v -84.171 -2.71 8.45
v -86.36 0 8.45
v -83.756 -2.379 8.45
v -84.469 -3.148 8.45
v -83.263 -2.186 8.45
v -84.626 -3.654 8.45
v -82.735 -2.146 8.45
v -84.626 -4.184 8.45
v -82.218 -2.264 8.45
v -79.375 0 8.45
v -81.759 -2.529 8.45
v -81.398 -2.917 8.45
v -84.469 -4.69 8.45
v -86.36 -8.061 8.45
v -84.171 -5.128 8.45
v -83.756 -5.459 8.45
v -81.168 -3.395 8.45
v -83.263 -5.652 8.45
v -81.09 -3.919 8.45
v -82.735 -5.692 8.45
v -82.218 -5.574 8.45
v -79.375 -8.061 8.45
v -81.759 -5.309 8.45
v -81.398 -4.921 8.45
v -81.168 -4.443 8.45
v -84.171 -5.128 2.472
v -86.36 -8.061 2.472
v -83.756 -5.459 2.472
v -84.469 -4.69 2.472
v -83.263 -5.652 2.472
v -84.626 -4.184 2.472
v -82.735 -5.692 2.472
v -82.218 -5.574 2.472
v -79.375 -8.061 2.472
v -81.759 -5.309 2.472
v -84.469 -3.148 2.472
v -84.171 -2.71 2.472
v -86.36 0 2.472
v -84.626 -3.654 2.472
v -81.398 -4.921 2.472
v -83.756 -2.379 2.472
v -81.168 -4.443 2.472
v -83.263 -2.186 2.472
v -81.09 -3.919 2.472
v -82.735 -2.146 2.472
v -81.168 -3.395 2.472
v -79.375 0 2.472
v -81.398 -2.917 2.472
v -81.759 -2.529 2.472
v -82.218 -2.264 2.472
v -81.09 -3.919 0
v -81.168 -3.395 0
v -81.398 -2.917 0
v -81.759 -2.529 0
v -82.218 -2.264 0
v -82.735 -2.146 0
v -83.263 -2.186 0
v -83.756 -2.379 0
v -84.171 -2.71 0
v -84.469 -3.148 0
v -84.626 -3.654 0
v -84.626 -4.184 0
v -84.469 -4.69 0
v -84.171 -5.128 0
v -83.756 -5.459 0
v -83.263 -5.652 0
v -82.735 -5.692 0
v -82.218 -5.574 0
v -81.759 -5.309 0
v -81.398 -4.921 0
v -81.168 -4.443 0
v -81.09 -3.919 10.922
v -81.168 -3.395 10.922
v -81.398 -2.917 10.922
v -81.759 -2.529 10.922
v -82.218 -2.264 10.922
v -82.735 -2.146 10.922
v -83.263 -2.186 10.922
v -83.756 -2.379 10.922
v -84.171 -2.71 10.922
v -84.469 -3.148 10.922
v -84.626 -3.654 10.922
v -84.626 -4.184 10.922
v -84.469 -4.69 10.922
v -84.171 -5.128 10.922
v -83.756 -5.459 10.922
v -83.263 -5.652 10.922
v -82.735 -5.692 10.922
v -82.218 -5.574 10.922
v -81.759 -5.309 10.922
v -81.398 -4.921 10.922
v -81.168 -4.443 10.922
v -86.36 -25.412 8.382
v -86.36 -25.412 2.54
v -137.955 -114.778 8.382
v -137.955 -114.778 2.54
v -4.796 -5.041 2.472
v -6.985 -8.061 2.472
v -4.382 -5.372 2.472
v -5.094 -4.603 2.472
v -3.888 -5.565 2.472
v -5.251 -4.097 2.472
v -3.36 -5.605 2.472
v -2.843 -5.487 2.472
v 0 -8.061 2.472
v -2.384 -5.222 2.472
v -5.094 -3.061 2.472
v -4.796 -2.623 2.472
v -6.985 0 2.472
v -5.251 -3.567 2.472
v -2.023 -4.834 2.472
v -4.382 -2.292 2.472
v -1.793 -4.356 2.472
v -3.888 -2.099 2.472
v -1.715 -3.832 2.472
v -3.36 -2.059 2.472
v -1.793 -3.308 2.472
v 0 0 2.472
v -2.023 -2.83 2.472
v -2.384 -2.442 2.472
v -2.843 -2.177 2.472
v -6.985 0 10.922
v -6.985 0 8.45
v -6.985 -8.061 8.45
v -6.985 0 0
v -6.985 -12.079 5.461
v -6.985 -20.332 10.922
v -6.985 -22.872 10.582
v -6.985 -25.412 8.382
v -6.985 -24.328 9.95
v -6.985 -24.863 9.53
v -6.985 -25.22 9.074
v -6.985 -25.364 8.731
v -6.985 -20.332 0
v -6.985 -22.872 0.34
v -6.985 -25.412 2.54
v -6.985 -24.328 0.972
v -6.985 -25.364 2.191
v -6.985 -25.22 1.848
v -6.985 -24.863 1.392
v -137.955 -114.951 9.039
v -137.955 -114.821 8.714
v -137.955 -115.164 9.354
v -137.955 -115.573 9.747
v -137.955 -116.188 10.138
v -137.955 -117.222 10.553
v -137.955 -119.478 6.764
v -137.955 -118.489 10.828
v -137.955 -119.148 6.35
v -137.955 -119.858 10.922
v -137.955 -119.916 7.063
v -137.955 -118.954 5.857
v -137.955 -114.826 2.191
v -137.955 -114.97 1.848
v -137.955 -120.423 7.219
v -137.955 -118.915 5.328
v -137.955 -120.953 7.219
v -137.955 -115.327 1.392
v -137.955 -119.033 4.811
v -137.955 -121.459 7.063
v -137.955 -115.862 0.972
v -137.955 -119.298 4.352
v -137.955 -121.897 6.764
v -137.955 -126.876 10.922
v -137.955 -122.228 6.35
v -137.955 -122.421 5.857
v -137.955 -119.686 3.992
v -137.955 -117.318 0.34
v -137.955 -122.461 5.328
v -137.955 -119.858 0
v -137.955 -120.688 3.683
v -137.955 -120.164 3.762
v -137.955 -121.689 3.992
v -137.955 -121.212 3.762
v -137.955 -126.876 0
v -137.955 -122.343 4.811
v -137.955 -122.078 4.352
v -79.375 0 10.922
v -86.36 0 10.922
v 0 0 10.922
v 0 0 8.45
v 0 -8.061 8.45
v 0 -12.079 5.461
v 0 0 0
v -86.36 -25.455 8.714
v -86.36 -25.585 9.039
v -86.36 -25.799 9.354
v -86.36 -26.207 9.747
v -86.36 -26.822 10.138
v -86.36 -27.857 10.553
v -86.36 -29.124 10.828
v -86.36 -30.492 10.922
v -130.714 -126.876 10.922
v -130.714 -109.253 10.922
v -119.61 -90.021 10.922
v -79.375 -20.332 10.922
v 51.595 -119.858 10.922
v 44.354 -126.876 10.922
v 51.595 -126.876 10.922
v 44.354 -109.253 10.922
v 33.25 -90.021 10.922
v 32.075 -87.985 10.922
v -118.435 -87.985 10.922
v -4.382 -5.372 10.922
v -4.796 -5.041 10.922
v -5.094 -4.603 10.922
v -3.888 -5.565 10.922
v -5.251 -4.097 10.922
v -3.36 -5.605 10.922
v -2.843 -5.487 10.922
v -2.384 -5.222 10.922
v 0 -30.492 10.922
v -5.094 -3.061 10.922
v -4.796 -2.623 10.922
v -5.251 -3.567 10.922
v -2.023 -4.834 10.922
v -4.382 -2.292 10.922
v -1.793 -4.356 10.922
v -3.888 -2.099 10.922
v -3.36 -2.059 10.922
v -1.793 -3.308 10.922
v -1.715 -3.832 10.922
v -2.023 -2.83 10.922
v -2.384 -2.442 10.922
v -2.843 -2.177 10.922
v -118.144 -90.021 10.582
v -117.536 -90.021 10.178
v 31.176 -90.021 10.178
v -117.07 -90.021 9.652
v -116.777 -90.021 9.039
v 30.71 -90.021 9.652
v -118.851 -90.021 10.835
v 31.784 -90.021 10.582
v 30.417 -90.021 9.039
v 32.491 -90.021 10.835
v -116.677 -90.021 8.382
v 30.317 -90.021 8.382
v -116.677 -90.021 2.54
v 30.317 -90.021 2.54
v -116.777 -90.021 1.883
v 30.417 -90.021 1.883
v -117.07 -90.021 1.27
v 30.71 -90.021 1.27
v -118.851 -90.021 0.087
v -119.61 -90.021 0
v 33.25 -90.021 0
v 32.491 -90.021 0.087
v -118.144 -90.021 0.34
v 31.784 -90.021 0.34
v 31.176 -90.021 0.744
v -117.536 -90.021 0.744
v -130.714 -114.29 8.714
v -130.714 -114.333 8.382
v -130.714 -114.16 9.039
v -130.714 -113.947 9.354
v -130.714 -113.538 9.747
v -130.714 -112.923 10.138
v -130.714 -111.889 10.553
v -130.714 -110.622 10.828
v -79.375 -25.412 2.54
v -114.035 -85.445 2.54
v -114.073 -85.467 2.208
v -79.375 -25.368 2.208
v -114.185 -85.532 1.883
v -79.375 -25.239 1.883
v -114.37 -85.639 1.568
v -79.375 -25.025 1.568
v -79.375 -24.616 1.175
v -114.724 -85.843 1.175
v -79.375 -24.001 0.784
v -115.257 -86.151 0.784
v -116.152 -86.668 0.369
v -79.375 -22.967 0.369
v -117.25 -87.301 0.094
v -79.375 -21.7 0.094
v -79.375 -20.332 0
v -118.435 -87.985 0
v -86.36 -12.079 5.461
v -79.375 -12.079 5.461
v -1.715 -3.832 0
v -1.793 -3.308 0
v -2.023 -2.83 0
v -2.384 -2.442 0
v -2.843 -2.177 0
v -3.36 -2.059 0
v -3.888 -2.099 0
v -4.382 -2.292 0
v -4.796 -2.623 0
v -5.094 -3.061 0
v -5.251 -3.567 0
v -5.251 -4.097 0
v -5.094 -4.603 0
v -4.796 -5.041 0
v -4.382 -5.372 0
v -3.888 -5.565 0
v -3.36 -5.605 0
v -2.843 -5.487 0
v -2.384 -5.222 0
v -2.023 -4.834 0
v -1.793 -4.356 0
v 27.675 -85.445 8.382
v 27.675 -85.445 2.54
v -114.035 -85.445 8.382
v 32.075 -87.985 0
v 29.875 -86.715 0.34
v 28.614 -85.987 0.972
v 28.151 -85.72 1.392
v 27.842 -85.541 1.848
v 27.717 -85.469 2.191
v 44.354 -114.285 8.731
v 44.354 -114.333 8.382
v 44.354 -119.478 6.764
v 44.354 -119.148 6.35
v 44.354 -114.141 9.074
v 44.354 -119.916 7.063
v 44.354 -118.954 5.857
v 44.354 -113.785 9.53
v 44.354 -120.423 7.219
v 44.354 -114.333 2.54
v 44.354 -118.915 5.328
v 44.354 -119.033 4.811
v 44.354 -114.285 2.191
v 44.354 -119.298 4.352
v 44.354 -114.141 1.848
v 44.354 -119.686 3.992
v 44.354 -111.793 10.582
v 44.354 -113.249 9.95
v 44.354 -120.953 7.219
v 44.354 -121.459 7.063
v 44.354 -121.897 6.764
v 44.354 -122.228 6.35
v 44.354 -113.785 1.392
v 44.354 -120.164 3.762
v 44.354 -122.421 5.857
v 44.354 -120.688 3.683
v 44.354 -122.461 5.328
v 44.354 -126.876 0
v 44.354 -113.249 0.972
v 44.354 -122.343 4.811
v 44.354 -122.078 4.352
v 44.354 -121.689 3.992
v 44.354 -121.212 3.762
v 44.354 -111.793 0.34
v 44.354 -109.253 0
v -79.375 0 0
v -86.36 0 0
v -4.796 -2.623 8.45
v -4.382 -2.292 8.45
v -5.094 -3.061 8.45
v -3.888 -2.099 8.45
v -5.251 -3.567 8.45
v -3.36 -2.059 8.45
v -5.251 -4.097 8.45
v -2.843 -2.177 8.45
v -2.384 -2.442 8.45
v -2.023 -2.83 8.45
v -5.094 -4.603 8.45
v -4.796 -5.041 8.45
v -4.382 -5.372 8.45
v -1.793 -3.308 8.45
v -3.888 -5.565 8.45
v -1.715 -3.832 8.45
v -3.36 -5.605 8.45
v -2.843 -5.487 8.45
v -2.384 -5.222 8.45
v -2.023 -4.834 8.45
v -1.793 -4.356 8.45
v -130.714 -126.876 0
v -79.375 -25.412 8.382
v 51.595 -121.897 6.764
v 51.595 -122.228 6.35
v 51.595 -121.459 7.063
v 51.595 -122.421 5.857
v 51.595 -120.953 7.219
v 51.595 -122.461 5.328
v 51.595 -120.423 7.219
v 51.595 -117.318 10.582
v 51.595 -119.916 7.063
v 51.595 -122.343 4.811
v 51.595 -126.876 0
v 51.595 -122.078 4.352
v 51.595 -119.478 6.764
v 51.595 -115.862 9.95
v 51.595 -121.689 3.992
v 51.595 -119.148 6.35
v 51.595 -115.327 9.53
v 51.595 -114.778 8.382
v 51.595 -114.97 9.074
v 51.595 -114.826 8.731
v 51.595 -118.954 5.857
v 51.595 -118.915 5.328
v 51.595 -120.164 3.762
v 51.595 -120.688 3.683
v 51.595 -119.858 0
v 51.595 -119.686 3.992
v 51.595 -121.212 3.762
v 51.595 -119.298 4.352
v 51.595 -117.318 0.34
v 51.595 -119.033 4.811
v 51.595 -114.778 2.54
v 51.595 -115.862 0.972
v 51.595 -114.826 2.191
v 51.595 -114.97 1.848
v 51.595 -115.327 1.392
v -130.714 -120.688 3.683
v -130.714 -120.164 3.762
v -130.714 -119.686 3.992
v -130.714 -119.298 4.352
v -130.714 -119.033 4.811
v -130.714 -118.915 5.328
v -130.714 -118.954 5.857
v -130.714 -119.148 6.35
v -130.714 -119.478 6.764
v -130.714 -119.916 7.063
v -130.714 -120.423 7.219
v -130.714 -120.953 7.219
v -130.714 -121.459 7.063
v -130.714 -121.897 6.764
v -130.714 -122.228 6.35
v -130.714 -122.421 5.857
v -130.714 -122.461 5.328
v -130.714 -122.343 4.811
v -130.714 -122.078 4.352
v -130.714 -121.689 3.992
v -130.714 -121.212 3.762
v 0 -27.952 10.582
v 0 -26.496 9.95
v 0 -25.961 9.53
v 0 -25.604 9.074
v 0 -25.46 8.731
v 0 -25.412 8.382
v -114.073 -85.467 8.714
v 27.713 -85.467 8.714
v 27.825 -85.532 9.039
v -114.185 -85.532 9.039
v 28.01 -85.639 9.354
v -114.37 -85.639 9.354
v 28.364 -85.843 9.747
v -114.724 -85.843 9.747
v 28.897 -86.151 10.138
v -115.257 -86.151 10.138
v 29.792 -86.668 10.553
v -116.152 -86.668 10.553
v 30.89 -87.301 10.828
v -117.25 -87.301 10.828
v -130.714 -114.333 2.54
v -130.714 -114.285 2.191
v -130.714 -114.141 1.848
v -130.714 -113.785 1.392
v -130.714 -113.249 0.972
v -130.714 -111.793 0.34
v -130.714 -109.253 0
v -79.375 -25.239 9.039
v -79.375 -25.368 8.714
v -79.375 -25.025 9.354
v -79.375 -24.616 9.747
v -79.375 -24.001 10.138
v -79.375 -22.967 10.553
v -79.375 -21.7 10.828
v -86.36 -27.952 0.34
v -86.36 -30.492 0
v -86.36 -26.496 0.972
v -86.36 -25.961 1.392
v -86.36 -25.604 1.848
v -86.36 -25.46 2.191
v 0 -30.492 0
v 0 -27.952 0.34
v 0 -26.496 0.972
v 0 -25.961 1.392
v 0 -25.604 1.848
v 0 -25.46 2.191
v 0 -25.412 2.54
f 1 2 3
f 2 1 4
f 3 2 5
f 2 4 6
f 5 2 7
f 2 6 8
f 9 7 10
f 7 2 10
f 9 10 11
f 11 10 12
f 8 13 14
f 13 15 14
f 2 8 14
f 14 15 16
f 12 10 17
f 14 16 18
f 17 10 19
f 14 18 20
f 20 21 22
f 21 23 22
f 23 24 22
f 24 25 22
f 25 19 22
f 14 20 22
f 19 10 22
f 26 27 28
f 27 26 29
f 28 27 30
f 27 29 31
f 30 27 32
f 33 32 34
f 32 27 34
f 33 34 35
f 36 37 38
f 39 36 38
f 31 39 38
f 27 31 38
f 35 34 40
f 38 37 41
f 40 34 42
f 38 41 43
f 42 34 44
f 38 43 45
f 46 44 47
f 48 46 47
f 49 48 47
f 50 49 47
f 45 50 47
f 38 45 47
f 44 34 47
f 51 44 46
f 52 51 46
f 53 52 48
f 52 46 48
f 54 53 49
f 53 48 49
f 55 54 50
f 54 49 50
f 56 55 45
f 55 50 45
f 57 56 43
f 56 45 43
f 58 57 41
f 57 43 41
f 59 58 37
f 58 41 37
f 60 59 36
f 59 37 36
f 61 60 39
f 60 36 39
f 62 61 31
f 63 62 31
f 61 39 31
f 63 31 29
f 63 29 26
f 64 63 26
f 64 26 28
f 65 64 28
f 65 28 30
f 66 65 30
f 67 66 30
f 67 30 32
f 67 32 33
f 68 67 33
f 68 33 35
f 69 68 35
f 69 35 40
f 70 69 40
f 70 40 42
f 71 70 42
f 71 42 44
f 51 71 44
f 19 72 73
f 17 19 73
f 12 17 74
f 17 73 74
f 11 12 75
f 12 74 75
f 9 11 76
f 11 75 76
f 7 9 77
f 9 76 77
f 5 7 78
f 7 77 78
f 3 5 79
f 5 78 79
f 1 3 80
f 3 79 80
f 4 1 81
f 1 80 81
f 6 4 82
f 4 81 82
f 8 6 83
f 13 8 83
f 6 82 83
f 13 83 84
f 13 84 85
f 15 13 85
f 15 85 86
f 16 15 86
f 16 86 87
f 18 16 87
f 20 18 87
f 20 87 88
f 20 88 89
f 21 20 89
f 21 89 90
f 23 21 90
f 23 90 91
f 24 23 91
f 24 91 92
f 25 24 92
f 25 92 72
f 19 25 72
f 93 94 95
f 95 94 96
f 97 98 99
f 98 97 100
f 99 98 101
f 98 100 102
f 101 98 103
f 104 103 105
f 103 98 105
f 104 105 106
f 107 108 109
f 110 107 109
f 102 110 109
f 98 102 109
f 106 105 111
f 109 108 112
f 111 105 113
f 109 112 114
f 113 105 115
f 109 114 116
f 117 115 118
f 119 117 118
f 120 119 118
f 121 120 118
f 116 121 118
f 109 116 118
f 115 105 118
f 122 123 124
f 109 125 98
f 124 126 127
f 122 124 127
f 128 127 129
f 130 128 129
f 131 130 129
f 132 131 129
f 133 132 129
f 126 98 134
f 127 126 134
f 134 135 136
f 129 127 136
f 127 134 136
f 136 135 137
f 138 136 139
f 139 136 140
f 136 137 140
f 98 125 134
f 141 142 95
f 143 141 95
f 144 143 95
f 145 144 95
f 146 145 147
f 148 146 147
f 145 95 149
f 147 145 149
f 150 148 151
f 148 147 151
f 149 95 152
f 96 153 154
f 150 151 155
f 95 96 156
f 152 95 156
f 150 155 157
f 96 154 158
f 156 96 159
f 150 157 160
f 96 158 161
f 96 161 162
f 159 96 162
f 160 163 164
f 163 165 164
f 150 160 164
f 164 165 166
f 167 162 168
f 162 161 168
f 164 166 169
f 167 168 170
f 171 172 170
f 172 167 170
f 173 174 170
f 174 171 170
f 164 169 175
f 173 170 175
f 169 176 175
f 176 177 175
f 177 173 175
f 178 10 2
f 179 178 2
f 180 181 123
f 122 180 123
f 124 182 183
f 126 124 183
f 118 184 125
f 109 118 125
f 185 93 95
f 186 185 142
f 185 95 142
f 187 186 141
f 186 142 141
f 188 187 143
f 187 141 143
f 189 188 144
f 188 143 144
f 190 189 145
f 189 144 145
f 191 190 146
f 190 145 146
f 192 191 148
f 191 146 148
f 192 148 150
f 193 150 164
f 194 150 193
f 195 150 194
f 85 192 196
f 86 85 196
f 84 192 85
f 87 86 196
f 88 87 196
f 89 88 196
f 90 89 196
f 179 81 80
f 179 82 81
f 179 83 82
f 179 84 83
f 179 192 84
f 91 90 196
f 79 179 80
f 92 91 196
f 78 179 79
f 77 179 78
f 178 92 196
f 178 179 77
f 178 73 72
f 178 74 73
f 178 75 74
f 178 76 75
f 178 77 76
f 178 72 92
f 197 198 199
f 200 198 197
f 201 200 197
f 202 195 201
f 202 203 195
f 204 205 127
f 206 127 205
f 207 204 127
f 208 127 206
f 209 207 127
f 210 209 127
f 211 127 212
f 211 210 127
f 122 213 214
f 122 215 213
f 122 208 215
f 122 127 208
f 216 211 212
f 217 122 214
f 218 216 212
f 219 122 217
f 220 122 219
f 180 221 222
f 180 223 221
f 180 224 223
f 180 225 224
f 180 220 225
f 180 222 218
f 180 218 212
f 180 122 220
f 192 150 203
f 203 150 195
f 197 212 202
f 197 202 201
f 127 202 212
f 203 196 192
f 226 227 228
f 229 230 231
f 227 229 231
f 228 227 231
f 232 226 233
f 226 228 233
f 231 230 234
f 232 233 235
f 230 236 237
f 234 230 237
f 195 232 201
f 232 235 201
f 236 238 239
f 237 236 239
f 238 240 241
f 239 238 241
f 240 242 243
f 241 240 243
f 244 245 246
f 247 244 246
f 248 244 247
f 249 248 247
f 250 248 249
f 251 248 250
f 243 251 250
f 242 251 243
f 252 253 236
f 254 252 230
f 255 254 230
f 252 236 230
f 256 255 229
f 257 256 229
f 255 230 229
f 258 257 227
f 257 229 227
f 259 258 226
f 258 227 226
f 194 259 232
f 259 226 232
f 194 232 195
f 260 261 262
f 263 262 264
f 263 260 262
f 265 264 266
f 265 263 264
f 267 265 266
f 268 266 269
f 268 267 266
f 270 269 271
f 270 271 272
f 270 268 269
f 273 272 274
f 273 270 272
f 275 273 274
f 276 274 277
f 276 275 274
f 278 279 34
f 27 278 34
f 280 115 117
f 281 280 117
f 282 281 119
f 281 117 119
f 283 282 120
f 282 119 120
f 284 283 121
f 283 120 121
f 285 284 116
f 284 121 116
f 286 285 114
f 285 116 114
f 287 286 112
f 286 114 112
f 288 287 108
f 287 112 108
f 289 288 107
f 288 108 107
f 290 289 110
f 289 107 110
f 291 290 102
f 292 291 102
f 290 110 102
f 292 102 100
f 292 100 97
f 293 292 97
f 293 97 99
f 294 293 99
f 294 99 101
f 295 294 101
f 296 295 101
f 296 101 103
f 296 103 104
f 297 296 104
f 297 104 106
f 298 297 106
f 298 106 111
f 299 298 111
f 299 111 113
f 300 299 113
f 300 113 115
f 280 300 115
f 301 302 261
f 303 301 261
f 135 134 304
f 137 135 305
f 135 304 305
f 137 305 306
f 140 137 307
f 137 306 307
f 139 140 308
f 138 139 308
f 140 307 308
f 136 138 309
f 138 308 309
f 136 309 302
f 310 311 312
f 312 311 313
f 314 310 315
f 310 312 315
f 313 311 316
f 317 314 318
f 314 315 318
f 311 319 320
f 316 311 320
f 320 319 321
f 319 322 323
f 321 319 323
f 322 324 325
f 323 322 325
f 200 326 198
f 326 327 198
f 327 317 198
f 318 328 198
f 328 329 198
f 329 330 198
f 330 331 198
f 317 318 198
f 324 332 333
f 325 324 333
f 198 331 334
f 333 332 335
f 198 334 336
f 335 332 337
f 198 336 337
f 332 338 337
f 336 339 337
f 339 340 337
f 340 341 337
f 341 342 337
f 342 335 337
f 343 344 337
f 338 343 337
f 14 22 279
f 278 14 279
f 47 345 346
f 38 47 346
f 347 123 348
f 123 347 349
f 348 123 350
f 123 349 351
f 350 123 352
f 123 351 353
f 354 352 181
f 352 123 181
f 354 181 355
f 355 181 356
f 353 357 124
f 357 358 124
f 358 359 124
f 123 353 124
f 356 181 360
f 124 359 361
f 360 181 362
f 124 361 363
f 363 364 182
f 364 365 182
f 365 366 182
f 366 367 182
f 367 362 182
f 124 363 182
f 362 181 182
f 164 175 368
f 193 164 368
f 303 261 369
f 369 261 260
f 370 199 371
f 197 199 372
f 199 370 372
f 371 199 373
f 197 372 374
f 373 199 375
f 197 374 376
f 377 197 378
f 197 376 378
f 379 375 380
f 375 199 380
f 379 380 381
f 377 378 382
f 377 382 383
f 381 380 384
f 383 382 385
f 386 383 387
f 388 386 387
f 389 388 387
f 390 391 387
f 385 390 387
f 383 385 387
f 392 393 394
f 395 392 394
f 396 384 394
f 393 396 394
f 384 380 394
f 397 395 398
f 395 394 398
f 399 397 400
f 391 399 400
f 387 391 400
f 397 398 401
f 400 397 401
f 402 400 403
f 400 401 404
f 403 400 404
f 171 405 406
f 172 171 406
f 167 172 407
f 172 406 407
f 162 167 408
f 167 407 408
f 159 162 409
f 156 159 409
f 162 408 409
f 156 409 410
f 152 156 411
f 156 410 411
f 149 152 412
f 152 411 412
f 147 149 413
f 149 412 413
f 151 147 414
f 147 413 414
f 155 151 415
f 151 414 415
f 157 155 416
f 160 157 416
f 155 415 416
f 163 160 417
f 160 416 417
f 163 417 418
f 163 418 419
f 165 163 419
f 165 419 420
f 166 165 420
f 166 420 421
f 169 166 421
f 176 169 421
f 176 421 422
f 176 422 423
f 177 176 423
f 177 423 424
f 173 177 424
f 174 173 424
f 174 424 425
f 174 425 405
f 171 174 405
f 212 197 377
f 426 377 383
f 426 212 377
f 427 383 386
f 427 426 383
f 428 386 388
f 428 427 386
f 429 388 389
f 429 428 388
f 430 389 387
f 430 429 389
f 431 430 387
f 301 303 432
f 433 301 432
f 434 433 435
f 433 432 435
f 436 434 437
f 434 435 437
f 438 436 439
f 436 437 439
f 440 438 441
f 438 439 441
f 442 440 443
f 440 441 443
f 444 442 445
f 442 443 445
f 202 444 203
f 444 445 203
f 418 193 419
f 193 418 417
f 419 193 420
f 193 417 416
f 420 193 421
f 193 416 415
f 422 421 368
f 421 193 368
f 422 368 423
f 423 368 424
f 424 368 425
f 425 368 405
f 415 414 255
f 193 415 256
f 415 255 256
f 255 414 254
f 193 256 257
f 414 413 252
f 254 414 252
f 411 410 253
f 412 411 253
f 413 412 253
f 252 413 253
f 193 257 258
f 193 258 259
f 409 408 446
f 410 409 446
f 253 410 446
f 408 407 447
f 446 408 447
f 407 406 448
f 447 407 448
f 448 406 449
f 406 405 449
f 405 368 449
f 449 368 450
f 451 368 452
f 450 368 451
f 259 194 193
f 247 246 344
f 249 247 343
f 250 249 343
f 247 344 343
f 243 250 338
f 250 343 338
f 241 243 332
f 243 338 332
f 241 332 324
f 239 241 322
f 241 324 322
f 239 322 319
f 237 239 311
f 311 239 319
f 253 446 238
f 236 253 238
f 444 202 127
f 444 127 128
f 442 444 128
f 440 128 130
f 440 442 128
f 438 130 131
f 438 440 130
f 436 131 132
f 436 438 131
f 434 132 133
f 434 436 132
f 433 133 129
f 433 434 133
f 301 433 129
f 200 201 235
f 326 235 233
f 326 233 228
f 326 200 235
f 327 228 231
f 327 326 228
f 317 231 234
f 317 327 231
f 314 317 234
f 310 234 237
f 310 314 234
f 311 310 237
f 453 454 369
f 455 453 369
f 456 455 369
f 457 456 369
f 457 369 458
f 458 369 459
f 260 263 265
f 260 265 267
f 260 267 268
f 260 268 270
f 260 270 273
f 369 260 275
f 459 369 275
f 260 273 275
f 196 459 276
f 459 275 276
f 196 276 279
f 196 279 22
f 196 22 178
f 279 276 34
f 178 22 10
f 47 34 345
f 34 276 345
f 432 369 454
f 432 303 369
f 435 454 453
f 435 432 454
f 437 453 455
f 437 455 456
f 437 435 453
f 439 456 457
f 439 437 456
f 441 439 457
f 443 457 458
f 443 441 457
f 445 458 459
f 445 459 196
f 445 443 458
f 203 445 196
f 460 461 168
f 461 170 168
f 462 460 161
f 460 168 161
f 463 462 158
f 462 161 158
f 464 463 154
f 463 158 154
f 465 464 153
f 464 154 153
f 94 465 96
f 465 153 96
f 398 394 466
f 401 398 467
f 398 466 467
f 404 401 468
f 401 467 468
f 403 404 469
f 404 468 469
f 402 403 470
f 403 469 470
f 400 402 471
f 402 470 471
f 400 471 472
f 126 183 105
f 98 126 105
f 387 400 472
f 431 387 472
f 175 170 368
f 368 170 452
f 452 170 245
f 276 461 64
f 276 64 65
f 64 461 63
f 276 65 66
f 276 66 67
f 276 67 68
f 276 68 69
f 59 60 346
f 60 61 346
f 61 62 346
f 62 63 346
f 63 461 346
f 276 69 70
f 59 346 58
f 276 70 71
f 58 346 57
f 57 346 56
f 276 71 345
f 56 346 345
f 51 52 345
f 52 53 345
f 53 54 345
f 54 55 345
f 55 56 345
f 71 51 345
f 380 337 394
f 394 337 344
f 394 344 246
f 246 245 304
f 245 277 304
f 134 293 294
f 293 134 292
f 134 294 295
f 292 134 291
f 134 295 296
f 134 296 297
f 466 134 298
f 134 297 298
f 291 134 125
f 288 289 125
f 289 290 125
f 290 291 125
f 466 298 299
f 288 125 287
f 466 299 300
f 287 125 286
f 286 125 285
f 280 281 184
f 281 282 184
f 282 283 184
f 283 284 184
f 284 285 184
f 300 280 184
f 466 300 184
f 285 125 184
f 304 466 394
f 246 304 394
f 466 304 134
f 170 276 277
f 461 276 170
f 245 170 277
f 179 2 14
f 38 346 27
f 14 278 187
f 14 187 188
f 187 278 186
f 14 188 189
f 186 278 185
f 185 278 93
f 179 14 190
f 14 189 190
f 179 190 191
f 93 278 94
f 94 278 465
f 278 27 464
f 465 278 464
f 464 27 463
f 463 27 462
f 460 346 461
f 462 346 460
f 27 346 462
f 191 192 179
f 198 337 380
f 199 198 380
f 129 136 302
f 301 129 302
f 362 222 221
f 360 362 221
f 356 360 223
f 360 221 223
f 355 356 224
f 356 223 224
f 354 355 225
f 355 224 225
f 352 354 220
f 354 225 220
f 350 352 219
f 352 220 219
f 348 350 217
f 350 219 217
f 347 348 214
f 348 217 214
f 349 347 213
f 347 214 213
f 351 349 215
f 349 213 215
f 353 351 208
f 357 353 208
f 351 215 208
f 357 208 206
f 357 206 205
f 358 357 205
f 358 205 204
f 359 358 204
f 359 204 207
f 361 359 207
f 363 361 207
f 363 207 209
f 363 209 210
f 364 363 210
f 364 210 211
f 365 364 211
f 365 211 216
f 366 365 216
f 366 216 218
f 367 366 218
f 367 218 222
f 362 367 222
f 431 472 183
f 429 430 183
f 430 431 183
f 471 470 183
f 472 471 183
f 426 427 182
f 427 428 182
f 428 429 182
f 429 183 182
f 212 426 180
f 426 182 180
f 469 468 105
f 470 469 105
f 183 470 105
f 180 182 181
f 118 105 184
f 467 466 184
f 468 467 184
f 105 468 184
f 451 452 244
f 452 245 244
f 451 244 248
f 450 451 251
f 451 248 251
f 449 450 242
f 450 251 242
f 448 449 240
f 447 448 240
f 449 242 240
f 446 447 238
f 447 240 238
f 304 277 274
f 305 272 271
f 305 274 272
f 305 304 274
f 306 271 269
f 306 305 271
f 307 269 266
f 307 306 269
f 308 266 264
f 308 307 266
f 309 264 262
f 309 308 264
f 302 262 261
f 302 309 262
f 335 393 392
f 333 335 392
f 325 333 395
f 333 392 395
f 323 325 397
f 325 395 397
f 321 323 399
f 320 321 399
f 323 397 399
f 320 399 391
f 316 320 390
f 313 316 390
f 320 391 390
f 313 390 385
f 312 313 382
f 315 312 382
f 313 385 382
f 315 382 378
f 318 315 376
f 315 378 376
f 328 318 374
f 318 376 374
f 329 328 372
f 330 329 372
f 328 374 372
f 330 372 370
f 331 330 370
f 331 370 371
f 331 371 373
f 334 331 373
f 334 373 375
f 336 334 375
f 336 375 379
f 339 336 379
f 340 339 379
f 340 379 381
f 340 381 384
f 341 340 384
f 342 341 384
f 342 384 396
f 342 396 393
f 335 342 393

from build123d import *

# Parameters (mm, degrees)
BOSS_EXTRUDE1_DEPTH = 10.922
CUT_EXTRUDE1_DEPTH  = 114.427
SKETCH4_R           = 1.778
CUT_EXTRUDE2_DEPTH  = 114.427
SKETCH5_R           = 1.778
CUT_EXTRUDE3_DEPTH  = 114.427
SKETCH6_R           = 1.778
CUT_EXTRUDE4_DEPTH  = 251.079
FILLET1_R           = 2.54
FILLET2_R           = 2.54
FILLET3_R           = 2.54
FILLET4_R           = 2.54
FILLET5_R           = 2.54
FILLET6_R           = 2.54


with BuildPart() as part:
    # Sketch1 → Boss-Extrude1 (new body)
    with BuildSketch(Plane.XY):
        Polygon((0, -25.411879188), (0, 0), (-6.985, 0), (-6.985, -25.411879188), (27.675318213, -85.445311339), (-114.035318213, -85.445311339), (-79.375, -25.411879188), (-79.375, 0), (-86.36, 0), (-86.36, -25.411879188), (-137.955366837, -114.777675985), (-137.955366837, -126.876050876), (-130.713866793, -126.876050876), (-130.713866793, -114.333404876), (-116.677285334, -90.021332625), (30.317285334, -90.021332625), (44.353866793, -114.333404876), (44.353866793, -126.876050876), (51.595366837, -126.876050876), (51.595366837, -114.777675985), align=None)
    extrude(amount=BOSS_EXTRUDE1_DEPTH)

    # Sketch3 → Cut-Extrude1 (cut)
    with BuildSketch(Plane(origin=(0, 0, 0), x_dir=(0, 0, -1), z_dir=(1, 0, 0))):
        Polygon((-2.471808629, 0), (-2.492726697, 0), (-8.450191371, 0), (-8.450191371, -8.061399091), (-5.461, -12.079224104), (-2.471808629, -8.061399091), align=None)
    extrude(amount=-CUT_EXTRUDE1_DEPTH, mode=Mode.SUBTRACT)

    # Sketch4 → Cut-Extrude2 (cut)
    with BuildSketch(Plane.XY.offset(10.922)):
        with Locations((-3.4925, -3.83202166)):
            Circle(SKETCH4_R)
    extrude(amount=-CUT_EXTRUDE2_DEPTH, mode=Mode.SUBTRACT)

    # Sketch5 → Cut-Extrude3 (cut)
    with BuildSketch(Plane.XY.offset(10.922)):
        with Locations((-82.8675, -3.918997874)):
            Circle(SKETCH5_R)
    extrude(amount=-CUT_EXTRUDE3_DEPTH, mode=Mode.SUBTRACT)

    # Sketch6 → Cut-Extrude4 (cut)
    with BuildSketch(Plane(origin=(51.595366837, 0, 0), x_dir=(0, 0, -1), z_dir=(1, 0, 0))):
        with Locations((-5.461, -120.687777383)):
            Circle(SKETCH6_R)
    extrude(amount=-CUT_EXTRUDE4_DEPTH, mode=Mode.SUBTRACT)

    # Fillet1
    fillet1_edges = [part.edges().sort_by_distance(p)[0] for p in [
        (37.335576064, -102.177368751, 10.922),
        (25.797683419, -70.094777586, 10.922),
        (10.345159107, -55.428595263, 10.922),
    ]]
    fillet(fillet1_edges, radius=FILLET1_R)

    # Fillet2
    fillet2_edges = [part.edges().sort_by_distance(p)[0] for p in [
        (10.345159107, -55.428595263, 0),
        (25.797683419, -70.094777586, 0),
        (37.335576064, -102.177368751, 0),
    ]]
    fillet(fillet2_edges, radius=FILLET2_R)

    # Fillet3
    fillet3_edges = [part.edges().sort_by_distance(p)[0] for p in [
        (-41.713530316, -85.445311339, 10.922),
    ]]
    fillet(fillet3_edges, radius=FILLET3_R)

    # Fillet4
    fillet4_edges = [part.edges().sort_by_distance(p)[0] for p in [
        (-41.713530316, -85.445311339, 0),
    ]]
    fillet(fillet4_edges, radius=FILLET4_R)

    # Fillet5
    fillet5_edges = [part.edges().sort_by_distance(p)[0] for p in [
        (-97.438393948, -56.698595263, 0),
        (-123.695576064, -102.177368751, 10.922),
        (-112.157683419, -70.094777586, 10.922),
        (-97.438393948, -56.698595263, 10.922),
    ]]
    fillet(fillet5_edges, radius=FILLET5_R)

    # Fillet6
    fillet6_edges = [part.edges().sort_by_distance(p)[0] for p in [
        (-112.157683419, -70.094777586, 0),
        (-123.695576064, -102.177368751, 0),
    ]]
    fillet(fillet6_edges, radius=FILLET6_R)


solid = part.part
